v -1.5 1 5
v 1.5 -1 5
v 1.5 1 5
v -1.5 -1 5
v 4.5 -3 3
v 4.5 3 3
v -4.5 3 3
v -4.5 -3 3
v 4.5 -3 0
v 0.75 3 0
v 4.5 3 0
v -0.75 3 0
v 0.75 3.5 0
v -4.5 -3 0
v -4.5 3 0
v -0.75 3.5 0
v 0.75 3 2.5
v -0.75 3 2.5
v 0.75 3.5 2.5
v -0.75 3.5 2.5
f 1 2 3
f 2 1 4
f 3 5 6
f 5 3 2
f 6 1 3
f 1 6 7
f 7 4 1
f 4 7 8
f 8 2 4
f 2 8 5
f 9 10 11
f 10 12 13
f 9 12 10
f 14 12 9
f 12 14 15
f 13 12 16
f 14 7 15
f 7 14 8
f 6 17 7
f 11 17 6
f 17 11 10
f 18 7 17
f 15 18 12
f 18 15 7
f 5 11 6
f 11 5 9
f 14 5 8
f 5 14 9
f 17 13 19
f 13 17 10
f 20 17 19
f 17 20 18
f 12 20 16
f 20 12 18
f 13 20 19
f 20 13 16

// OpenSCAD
translate([0,0,5]) {
	rotate(a=[0,180,0]) {
		color("red")
		linear_extrude(height = 2, scale=3) 
		square ([3,2],center = true);
	}
};

translate([0,0,0]) {
	color("gray")
	linear_extrude(height = 3)
	square ([9,6],center = true);
};

translate([-0.75,3,0]) {
	// rotate(a=[0,90,0])
	cube([1.5,0.5,2.5]);
};
